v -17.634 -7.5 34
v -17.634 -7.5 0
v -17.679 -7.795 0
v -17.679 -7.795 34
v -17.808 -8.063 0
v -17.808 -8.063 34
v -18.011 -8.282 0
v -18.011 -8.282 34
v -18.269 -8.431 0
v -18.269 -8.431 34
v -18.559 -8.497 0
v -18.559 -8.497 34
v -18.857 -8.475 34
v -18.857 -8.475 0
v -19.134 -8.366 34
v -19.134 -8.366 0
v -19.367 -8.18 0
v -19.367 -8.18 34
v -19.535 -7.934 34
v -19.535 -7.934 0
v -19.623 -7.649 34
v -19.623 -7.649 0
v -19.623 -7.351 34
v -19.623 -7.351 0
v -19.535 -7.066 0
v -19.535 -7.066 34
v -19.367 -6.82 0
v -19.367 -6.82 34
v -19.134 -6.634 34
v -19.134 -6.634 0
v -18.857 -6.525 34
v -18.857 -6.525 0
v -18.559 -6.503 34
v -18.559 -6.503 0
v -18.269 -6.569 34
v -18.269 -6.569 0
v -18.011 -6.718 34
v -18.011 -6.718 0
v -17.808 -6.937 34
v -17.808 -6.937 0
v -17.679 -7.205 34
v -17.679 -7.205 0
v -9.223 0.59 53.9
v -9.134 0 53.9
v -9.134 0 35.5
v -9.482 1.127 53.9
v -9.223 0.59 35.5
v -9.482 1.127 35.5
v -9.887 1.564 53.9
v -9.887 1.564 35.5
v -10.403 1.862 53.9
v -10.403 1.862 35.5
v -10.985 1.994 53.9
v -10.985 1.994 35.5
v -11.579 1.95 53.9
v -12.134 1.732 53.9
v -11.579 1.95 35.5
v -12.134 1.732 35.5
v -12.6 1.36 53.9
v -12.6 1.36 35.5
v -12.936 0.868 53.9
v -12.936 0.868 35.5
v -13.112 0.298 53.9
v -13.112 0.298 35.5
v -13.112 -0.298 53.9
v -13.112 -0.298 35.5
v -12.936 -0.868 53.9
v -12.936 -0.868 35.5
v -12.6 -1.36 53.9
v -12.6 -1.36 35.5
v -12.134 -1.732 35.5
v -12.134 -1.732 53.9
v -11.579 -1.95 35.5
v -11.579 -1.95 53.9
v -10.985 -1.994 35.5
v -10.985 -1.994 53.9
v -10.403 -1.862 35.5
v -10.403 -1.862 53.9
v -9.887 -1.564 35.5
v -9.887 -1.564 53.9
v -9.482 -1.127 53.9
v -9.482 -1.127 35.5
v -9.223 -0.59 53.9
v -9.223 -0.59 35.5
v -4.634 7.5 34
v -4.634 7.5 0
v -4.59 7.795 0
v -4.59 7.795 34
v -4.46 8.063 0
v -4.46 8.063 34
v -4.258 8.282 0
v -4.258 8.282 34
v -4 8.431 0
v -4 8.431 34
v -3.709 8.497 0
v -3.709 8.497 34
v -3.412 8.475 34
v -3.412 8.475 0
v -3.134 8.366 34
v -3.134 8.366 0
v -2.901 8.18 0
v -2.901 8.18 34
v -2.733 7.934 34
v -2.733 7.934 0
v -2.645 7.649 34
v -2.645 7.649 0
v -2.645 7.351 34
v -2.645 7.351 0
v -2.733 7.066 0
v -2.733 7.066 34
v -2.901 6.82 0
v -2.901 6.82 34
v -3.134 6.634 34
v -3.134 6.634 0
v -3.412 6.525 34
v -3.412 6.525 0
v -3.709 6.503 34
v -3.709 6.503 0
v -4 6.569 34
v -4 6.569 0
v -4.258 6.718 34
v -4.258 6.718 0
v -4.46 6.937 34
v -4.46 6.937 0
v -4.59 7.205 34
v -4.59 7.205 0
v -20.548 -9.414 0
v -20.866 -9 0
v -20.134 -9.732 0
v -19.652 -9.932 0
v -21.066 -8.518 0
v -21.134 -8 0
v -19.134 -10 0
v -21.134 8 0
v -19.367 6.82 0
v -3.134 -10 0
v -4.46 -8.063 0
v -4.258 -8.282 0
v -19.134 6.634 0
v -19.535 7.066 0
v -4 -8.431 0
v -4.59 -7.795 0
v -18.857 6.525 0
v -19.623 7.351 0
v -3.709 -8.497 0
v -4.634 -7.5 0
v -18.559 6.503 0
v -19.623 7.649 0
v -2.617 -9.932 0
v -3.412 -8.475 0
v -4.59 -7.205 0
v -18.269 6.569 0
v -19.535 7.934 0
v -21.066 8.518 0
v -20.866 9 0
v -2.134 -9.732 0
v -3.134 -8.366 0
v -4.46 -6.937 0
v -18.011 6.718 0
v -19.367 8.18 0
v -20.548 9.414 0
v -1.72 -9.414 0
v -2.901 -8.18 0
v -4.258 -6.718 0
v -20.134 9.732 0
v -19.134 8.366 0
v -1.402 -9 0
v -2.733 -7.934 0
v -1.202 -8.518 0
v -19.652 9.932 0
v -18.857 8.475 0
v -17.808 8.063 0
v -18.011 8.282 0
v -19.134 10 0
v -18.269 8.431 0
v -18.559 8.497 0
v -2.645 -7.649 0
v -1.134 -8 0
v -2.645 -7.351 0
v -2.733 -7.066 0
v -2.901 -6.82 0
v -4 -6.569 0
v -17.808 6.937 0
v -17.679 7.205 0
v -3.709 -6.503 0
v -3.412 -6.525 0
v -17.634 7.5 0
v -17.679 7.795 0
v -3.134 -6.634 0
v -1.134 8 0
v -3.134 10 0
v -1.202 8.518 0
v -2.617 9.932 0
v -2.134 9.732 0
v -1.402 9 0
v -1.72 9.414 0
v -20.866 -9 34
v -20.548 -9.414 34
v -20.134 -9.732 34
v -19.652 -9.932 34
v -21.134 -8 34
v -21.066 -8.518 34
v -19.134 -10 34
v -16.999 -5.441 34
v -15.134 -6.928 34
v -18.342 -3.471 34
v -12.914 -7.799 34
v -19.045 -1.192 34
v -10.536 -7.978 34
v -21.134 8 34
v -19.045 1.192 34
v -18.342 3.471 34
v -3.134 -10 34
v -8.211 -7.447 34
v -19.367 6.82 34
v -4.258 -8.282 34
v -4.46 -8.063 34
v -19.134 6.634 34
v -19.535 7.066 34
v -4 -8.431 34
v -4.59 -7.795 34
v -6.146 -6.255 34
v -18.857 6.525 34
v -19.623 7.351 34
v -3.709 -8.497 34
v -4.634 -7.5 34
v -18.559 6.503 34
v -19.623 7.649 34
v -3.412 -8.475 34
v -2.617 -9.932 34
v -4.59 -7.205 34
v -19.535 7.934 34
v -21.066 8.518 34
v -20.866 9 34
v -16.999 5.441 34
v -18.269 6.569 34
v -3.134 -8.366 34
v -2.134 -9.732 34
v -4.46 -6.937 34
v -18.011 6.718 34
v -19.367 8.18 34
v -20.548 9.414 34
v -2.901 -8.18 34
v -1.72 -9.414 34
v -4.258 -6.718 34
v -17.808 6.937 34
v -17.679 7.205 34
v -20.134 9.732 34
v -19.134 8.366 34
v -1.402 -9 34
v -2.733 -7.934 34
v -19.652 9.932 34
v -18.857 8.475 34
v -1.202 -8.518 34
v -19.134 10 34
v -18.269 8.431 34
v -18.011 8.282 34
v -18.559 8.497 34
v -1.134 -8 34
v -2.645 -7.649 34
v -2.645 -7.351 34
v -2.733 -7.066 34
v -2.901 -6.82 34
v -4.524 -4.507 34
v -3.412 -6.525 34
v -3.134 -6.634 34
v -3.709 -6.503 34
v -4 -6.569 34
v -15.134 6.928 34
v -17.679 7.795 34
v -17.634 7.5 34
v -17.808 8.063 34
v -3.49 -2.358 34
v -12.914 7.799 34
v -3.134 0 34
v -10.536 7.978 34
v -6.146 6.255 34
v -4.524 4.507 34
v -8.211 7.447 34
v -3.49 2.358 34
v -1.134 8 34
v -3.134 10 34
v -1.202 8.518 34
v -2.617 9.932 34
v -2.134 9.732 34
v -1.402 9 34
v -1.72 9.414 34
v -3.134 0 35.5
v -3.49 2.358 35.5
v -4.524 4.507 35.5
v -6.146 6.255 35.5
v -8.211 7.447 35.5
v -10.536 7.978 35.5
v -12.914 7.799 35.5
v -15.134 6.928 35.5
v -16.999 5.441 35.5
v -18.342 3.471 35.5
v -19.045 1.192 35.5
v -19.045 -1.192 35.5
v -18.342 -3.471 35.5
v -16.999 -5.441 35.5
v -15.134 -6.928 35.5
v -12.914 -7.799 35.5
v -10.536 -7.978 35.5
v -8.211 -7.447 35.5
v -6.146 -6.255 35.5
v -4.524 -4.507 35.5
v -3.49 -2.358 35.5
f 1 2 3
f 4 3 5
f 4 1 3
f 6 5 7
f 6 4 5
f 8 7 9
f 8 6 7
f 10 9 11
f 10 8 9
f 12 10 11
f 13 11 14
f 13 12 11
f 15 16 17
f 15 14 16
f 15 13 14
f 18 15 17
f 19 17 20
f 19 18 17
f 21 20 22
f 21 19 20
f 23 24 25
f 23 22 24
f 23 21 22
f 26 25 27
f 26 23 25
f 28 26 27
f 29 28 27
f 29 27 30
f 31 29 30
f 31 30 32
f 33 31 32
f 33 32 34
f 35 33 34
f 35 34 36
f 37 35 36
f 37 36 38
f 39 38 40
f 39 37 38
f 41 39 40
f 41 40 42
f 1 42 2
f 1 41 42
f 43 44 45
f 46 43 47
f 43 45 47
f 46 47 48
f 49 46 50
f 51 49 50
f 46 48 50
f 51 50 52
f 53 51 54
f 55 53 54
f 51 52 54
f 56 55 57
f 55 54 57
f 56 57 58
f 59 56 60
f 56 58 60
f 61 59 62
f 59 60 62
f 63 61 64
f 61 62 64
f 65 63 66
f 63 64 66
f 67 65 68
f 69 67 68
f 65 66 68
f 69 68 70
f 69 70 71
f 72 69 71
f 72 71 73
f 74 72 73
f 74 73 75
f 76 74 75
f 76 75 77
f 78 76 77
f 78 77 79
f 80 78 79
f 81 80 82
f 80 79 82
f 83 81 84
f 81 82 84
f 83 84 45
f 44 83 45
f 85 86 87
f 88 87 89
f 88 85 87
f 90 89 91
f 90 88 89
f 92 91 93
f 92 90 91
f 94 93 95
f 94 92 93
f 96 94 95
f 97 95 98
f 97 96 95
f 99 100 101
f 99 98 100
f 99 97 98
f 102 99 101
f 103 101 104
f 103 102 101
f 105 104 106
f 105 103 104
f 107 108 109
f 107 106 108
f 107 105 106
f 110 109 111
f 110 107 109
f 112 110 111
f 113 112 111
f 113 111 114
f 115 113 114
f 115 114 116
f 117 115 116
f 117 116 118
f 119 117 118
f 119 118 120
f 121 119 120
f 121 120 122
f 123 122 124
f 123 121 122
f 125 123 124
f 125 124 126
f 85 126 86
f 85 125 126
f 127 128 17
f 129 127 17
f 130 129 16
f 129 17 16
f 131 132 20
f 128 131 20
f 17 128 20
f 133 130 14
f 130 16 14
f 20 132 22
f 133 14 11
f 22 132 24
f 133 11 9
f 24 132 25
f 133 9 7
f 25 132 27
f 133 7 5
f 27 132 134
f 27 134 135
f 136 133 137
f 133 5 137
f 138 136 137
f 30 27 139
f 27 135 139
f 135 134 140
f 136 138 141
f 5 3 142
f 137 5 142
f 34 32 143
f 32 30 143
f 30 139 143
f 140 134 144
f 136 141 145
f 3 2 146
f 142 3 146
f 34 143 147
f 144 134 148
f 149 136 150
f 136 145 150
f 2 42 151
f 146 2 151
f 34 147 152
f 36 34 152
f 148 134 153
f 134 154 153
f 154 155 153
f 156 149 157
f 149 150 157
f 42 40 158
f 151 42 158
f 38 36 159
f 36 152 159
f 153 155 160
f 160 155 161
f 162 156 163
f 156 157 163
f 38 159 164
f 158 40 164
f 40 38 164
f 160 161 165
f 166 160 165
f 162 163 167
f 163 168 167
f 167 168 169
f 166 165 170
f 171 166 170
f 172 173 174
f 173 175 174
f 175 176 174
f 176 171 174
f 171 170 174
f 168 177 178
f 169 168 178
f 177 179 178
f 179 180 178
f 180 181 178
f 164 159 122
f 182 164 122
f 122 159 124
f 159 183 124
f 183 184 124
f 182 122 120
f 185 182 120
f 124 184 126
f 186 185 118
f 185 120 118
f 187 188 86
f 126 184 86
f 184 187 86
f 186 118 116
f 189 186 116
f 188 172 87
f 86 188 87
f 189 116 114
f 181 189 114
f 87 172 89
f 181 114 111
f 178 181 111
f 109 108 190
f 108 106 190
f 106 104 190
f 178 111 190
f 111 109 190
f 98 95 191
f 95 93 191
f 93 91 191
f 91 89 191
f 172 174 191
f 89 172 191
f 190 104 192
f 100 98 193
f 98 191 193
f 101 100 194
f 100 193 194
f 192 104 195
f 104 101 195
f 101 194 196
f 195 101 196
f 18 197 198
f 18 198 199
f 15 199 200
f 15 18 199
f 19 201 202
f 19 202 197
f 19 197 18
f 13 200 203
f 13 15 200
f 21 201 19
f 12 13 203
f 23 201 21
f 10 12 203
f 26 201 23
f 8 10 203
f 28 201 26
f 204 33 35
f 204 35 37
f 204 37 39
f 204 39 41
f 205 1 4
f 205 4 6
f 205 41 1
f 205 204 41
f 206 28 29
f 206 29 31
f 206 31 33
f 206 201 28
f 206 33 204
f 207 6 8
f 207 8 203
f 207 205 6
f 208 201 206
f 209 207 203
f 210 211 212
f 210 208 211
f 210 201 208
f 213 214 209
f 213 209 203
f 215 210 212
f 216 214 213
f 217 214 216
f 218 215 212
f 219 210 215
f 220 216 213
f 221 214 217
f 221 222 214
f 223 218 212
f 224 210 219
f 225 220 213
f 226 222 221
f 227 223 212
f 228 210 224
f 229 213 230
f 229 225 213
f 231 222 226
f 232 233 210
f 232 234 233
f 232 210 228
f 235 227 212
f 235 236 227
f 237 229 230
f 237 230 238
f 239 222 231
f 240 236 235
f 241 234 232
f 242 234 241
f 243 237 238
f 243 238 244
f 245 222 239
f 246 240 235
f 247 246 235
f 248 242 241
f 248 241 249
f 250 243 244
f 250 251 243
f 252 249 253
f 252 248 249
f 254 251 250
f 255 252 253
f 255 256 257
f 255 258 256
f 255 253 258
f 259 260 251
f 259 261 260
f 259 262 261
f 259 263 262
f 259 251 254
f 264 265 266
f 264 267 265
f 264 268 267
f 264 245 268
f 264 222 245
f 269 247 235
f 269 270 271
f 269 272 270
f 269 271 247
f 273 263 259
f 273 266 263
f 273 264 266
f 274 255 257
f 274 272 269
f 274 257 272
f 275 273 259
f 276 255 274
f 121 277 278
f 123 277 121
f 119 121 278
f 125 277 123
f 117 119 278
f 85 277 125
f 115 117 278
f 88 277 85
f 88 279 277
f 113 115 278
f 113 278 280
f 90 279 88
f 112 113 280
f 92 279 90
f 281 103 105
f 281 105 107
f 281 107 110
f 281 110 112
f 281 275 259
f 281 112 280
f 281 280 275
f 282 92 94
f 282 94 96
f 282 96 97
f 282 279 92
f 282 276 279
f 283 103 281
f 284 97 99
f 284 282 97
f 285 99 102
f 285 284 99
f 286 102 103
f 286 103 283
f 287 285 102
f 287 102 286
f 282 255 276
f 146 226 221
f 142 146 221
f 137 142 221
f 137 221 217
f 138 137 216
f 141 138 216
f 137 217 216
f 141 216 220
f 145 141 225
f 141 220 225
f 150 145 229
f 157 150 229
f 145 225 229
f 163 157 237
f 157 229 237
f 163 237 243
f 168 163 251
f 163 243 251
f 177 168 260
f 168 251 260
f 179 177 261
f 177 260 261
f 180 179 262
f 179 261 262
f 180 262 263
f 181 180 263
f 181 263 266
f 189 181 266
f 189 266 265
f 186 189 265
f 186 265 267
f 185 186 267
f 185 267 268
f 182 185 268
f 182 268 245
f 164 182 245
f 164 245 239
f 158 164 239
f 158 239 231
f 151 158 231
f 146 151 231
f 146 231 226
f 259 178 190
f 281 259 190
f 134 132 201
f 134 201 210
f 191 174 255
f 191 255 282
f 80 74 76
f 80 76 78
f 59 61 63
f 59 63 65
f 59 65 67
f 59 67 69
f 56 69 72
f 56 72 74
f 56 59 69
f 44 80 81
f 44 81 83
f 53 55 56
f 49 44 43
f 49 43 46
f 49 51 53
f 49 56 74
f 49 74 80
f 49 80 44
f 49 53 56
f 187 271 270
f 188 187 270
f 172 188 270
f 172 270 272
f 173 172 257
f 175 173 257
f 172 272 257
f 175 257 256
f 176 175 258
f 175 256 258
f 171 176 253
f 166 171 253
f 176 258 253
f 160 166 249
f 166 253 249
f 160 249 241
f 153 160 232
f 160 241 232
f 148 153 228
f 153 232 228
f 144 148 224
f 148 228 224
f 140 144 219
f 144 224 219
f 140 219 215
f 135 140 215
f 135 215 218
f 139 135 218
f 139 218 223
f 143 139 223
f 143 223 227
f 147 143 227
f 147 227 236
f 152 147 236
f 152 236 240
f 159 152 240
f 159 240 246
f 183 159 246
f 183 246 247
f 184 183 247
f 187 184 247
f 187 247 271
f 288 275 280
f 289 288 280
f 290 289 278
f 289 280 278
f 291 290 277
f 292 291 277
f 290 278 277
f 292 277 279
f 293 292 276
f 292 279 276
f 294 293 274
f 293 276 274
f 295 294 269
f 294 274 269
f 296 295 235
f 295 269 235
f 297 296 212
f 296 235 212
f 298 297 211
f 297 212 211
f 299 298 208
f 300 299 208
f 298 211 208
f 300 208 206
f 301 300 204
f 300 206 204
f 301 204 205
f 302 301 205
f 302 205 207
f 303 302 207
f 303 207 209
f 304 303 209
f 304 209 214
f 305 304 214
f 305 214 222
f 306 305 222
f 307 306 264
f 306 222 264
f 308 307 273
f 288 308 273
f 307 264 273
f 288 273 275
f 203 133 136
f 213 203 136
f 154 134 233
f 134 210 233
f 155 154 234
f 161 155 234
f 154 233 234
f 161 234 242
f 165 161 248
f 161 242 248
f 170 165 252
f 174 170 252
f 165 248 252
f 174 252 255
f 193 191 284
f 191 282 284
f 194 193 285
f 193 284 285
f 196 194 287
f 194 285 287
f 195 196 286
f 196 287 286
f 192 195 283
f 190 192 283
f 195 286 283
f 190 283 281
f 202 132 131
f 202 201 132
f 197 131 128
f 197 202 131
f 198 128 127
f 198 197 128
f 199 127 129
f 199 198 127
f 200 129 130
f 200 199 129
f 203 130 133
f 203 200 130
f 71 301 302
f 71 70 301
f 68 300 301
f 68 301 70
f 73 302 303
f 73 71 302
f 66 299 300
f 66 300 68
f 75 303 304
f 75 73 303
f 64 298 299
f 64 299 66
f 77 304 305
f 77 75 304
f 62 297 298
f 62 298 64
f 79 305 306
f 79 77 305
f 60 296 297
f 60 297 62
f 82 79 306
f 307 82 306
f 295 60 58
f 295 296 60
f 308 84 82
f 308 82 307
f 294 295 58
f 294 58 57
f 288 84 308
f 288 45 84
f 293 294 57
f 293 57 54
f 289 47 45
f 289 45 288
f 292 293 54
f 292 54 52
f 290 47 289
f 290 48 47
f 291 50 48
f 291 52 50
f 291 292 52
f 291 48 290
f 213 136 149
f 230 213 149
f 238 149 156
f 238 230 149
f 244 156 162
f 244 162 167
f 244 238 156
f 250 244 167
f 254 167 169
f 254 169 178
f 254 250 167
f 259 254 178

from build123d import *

# Parameters (mm, degrees)
SKETCH_1_W               = 20
SKETCH_1_H               = 20
EXTRUDE_1_DEPTH          = 34
SKETCH_2_R               = 8
EXTRUDE_2_DEPTH          = 1.5
SKETCH_3_R               = 2
EXTRUDE_3_DEPTH          = 18.4
SKETCH_4_R               = 1
CUT_EXTRUDE_1_DEPTH      = 42.263223045
MIRROR_2_COPY_1_SKETCH_R = 1
MIRROR_2_COPY_1_DEPTH    = 42.263223045
FILLET_2_R               = 2


with BuildPart() as part:
    # 草圖1 → 填料-伸長1 (new body)
    with BuildSketch(Plane.XY):
        with Locations((-11.134180278, 0)):
            Rectangle(SKETCH_1_W, SKETCH_1_H)
    extrude(amount=EXTRUDE_1_DEPTH)

    # 草圖2 → 填料-伸長2 (add)
    with BuildSketch(Plane.XY.offset(34)):
        with Locations((-11.134180278, 0)):
            Circle(SKETCH_2_R)
    extrude(amount=EXTRUDE_2_DEPTH)

    # 草圖3 → 填料-伸長3 (add)
    with BuildSketch(Plane.XY.offset(35.5)):
        with Locations((-11.134180278, 0)):
            Circle(SKETCH_3_R)
    extrude(amount=EXTRUDE_3_DEPTH)

    # 草圖4 → 除料-伸長1 (cut, through all)
    with BuildSketch(Plane.XY.offset(34)):
        with Locations((-18.634180278, 7.5)):
            Circle(SKETCH_4_R)
    cut_extrude_1 = extrude(amount=-CUT_EXTRUDE_1_DEPTH, mode=Mode.SUBTRACT)

    # 鏡射1: 除料-伸長1 across plane
    add(cut_extrude_1.mirror(Plane.ZY.offset(11.134180278)), mode=Mode.SUBTRACT)

    # 鏡射2: 除料-伸長1 across plane
    add(cut_extrude_1.mirror(Plane(origin=(0, 0, 0), x_dir=(0, 0, 1), z_dir=(0, -1, 0))), mode=Mode.SUBTRACT)

    # 鏡射2 copy 1 sketch → 鏡射2 copy 1 (cut, through all)
    with BuildSketch(Plane(origin=(-22.268360557, 0, 34), x_dir=(-1, 0, 0), z_dir=(0, 0, 1))):
        with Locations((-18.634180278, 7.5)):
            Circle(MIRROR_2_COPY_1_SKETCH_R)
    extrude(amount=-MIRROR_2_COPY_1_DEPTH, mode=Mode.SUBTRACT)

    # 圓角2
    fillet_2_edges = [part.edges().sort_by_distance(p)[0] for p in [
        (-21.134180278, 10, 17),
        (-1.134180278, 10, 17),
        (-1.134180278, -10, 17),
        (-21.134180278, -10, 17),
    ]]
    fillet(fillet_2_edges, radius=FILLET_2_R)


solid = part.part
